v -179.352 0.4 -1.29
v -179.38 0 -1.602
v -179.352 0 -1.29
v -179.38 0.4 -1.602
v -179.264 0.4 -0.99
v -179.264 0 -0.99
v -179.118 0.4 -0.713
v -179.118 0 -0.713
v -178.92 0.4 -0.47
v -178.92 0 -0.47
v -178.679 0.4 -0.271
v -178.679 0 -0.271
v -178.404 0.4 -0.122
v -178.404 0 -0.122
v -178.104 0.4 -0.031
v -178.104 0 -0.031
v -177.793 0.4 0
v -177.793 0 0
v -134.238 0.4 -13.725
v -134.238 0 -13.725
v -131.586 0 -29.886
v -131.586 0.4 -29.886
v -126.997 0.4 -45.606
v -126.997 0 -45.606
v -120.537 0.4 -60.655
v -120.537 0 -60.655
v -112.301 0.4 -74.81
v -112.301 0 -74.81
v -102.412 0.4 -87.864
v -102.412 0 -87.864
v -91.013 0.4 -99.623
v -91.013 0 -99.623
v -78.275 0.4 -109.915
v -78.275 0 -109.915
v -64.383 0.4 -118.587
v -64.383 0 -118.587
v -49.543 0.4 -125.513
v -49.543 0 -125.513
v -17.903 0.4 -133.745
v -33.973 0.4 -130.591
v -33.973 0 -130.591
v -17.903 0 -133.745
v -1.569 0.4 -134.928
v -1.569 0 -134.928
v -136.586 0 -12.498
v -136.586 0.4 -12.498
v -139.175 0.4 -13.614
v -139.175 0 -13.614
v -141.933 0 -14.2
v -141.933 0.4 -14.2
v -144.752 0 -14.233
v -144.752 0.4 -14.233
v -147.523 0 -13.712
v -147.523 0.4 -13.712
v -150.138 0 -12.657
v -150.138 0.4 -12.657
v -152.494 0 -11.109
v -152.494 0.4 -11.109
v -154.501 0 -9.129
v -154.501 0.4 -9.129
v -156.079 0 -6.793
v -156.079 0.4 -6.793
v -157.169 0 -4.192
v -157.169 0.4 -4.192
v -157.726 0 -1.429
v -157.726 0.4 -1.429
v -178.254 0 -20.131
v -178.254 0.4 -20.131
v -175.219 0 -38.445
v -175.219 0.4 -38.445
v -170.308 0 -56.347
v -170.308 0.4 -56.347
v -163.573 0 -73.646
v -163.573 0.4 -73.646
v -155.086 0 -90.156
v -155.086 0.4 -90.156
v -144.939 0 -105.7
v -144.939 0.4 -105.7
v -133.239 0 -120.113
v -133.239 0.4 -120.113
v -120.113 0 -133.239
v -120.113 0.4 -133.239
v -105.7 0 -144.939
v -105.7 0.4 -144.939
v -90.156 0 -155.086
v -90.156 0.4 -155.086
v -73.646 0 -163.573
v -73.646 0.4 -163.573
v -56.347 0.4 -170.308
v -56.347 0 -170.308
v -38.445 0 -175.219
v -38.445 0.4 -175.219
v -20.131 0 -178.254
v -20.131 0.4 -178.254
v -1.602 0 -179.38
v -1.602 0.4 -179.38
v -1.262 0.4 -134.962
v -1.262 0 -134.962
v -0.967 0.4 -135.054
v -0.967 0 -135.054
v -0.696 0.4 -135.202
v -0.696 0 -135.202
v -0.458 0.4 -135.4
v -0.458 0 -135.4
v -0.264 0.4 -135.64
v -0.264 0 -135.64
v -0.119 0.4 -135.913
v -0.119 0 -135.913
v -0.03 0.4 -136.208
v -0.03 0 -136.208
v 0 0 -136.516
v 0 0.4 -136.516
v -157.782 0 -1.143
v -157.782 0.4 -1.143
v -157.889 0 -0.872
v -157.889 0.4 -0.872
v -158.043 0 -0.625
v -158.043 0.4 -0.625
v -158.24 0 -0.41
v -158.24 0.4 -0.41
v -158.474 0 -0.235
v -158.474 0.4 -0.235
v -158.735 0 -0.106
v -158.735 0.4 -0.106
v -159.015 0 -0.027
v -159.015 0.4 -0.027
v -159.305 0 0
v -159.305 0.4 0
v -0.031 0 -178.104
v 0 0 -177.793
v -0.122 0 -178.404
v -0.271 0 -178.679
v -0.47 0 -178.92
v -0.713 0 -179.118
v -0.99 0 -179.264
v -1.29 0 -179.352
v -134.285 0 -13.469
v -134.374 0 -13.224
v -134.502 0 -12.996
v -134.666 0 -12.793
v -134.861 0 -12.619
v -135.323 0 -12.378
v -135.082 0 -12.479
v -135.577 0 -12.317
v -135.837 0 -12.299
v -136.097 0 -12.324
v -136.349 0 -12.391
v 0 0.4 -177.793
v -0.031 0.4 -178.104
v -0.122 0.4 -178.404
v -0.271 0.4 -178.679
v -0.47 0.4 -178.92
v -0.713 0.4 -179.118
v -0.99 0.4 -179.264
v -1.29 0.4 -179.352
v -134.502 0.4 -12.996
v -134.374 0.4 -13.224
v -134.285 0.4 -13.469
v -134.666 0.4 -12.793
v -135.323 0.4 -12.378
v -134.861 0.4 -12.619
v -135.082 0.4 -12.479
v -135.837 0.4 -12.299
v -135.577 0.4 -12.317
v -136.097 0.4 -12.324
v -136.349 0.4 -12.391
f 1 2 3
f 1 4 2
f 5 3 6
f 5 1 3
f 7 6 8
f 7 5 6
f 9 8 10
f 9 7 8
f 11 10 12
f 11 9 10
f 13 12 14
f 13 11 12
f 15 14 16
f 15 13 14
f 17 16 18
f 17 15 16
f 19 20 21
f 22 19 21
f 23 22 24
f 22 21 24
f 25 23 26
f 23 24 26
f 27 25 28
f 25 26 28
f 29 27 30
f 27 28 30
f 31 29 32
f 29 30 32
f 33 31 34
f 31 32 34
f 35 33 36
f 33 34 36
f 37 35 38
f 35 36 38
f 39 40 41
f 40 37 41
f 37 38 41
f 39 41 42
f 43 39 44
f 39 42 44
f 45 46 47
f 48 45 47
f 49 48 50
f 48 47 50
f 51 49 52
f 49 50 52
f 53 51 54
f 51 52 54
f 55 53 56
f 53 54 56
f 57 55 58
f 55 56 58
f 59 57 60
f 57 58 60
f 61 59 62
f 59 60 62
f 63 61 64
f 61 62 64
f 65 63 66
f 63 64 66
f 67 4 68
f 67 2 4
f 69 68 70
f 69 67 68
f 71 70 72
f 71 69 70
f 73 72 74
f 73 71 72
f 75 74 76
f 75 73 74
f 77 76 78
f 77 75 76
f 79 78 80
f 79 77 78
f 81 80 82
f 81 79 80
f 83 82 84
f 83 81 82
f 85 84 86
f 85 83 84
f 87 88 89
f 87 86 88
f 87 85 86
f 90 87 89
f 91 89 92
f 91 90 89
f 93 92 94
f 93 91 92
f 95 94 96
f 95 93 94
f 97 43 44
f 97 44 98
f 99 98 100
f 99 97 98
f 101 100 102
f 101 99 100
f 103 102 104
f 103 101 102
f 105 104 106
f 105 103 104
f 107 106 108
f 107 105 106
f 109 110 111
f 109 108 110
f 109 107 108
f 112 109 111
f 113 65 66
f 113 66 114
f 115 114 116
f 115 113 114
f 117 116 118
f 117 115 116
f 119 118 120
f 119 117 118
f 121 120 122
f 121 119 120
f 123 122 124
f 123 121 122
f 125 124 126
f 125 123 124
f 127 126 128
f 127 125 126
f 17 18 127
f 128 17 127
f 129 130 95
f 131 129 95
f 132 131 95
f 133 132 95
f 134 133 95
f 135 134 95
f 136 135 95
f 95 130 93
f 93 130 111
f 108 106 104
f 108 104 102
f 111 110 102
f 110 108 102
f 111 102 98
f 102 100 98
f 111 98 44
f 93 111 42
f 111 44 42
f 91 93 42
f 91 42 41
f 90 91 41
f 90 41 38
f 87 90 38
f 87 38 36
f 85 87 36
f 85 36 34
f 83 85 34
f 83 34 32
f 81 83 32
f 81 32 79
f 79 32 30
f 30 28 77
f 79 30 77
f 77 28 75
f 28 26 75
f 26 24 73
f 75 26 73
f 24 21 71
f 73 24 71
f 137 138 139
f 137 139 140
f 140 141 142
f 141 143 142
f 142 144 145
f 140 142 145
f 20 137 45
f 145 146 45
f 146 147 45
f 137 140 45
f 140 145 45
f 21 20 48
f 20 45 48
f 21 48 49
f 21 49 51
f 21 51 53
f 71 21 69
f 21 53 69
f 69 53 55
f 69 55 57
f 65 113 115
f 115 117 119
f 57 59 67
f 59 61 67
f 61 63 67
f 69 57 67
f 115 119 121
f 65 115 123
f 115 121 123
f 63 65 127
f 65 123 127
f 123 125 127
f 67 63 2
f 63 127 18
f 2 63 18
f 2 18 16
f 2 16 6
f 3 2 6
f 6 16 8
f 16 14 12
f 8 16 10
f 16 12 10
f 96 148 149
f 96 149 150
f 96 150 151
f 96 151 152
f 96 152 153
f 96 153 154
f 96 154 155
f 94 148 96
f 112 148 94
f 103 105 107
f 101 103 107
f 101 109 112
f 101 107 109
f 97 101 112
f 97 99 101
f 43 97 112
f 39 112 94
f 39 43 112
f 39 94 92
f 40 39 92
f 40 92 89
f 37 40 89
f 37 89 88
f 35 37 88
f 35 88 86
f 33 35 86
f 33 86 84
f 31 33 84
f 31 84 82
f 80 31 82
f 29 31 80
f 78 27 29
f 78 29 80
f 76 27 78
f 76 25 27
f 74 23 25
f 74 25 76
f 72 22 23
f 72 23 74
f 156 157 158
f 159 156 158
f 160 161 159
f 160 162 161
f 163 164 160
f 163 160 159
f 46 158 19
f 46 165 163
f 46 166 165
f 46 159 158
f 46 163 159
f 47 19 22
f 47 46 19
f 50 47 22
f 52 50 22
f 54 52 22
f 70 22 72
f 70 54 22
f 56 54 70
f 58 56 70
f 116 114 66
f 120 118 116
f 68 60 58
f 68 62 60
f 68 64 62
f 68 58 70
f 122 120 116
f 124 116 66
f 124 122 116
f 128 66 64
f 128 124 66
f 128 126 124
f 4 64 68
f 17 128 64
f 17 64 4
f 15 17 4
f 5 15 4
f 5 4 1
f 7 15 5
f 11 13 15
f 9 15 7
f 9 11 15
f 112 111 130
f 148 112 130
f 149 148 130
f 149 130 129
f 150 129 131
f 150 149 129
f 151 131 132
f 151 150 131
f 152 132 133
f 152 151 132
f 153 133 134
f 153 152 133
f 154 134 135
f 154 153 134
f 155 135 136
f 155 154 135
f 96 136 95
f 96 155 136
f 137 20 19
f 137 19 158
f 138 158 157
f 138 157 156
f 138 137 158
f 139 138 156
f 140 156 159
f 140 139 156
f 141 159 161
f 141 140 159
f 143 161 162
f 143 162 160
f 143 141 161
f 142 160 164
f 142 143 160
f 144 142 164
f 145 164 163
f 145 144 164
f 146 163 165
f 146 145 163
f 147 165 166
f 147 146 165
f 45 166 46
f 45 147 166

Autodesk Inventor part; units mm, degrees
ref_plane "YZ Plane" through (0, 0, 0) normal (1, 0, 0) x (0, 1, 0)
ref_plane "XZ Plane" through (0, 0, 0) normal (0, 1, 0) x (-1, 0, 0)
ref_plane "XY Plane" through (0, 0, 0) normal (0, 0, 1) x (1, 0, 0)
sketch "Sketch1" plane through (0, 0, 0) normal (0, 1, 0) x (-1, 0, 0)
  arc A0 (0, -179.3875) -> (179.3875, 0) centre (0, 0) ccw
  arc A1 (0, -134.9375) -> (134.9375, 0) centre (0, 0) ccw
  line L0 (179.3875, 0) -> (134.9375, 0)
  line L1 (0, -134.9375) -> (0, -179.3875)
  point P0 (0, -157.1625)
  point P1 (157.1625, 0)
  dimension "d0" = 179.3875
  dimension "d1" = 134.9375
extrude "Extrusion1" add sketch "Sketch1" along normal blind 0.4
sketch "Sketch2" plane through (0, 0.4, 0) normal (0, 1, 0) x (1, 0, 0)
  line L0 (-179.3875, 0) -> (-134.9375, 0) projected
  circle A0 centre (-143.51, 0) radius 14.2875
  point P0 (0, 0)
  dimension "d4" = 143.51
  dimension "d5" = 28.575
extrude "Extrusion2" cut sketch "Sketch2" against normal through all
fillet "Fillet1" radius 1.5875 5 edges at (-134.4823, 0.2, -11.074) (-157.7975, 0.2, 0) (-179.3875, 0.2, 0) (0, 0.2, -134.9375) (0, 0.2, -179.3875)
properties part number "3DPRINT,CABLE,GUARD" material "ABS Plastic"
